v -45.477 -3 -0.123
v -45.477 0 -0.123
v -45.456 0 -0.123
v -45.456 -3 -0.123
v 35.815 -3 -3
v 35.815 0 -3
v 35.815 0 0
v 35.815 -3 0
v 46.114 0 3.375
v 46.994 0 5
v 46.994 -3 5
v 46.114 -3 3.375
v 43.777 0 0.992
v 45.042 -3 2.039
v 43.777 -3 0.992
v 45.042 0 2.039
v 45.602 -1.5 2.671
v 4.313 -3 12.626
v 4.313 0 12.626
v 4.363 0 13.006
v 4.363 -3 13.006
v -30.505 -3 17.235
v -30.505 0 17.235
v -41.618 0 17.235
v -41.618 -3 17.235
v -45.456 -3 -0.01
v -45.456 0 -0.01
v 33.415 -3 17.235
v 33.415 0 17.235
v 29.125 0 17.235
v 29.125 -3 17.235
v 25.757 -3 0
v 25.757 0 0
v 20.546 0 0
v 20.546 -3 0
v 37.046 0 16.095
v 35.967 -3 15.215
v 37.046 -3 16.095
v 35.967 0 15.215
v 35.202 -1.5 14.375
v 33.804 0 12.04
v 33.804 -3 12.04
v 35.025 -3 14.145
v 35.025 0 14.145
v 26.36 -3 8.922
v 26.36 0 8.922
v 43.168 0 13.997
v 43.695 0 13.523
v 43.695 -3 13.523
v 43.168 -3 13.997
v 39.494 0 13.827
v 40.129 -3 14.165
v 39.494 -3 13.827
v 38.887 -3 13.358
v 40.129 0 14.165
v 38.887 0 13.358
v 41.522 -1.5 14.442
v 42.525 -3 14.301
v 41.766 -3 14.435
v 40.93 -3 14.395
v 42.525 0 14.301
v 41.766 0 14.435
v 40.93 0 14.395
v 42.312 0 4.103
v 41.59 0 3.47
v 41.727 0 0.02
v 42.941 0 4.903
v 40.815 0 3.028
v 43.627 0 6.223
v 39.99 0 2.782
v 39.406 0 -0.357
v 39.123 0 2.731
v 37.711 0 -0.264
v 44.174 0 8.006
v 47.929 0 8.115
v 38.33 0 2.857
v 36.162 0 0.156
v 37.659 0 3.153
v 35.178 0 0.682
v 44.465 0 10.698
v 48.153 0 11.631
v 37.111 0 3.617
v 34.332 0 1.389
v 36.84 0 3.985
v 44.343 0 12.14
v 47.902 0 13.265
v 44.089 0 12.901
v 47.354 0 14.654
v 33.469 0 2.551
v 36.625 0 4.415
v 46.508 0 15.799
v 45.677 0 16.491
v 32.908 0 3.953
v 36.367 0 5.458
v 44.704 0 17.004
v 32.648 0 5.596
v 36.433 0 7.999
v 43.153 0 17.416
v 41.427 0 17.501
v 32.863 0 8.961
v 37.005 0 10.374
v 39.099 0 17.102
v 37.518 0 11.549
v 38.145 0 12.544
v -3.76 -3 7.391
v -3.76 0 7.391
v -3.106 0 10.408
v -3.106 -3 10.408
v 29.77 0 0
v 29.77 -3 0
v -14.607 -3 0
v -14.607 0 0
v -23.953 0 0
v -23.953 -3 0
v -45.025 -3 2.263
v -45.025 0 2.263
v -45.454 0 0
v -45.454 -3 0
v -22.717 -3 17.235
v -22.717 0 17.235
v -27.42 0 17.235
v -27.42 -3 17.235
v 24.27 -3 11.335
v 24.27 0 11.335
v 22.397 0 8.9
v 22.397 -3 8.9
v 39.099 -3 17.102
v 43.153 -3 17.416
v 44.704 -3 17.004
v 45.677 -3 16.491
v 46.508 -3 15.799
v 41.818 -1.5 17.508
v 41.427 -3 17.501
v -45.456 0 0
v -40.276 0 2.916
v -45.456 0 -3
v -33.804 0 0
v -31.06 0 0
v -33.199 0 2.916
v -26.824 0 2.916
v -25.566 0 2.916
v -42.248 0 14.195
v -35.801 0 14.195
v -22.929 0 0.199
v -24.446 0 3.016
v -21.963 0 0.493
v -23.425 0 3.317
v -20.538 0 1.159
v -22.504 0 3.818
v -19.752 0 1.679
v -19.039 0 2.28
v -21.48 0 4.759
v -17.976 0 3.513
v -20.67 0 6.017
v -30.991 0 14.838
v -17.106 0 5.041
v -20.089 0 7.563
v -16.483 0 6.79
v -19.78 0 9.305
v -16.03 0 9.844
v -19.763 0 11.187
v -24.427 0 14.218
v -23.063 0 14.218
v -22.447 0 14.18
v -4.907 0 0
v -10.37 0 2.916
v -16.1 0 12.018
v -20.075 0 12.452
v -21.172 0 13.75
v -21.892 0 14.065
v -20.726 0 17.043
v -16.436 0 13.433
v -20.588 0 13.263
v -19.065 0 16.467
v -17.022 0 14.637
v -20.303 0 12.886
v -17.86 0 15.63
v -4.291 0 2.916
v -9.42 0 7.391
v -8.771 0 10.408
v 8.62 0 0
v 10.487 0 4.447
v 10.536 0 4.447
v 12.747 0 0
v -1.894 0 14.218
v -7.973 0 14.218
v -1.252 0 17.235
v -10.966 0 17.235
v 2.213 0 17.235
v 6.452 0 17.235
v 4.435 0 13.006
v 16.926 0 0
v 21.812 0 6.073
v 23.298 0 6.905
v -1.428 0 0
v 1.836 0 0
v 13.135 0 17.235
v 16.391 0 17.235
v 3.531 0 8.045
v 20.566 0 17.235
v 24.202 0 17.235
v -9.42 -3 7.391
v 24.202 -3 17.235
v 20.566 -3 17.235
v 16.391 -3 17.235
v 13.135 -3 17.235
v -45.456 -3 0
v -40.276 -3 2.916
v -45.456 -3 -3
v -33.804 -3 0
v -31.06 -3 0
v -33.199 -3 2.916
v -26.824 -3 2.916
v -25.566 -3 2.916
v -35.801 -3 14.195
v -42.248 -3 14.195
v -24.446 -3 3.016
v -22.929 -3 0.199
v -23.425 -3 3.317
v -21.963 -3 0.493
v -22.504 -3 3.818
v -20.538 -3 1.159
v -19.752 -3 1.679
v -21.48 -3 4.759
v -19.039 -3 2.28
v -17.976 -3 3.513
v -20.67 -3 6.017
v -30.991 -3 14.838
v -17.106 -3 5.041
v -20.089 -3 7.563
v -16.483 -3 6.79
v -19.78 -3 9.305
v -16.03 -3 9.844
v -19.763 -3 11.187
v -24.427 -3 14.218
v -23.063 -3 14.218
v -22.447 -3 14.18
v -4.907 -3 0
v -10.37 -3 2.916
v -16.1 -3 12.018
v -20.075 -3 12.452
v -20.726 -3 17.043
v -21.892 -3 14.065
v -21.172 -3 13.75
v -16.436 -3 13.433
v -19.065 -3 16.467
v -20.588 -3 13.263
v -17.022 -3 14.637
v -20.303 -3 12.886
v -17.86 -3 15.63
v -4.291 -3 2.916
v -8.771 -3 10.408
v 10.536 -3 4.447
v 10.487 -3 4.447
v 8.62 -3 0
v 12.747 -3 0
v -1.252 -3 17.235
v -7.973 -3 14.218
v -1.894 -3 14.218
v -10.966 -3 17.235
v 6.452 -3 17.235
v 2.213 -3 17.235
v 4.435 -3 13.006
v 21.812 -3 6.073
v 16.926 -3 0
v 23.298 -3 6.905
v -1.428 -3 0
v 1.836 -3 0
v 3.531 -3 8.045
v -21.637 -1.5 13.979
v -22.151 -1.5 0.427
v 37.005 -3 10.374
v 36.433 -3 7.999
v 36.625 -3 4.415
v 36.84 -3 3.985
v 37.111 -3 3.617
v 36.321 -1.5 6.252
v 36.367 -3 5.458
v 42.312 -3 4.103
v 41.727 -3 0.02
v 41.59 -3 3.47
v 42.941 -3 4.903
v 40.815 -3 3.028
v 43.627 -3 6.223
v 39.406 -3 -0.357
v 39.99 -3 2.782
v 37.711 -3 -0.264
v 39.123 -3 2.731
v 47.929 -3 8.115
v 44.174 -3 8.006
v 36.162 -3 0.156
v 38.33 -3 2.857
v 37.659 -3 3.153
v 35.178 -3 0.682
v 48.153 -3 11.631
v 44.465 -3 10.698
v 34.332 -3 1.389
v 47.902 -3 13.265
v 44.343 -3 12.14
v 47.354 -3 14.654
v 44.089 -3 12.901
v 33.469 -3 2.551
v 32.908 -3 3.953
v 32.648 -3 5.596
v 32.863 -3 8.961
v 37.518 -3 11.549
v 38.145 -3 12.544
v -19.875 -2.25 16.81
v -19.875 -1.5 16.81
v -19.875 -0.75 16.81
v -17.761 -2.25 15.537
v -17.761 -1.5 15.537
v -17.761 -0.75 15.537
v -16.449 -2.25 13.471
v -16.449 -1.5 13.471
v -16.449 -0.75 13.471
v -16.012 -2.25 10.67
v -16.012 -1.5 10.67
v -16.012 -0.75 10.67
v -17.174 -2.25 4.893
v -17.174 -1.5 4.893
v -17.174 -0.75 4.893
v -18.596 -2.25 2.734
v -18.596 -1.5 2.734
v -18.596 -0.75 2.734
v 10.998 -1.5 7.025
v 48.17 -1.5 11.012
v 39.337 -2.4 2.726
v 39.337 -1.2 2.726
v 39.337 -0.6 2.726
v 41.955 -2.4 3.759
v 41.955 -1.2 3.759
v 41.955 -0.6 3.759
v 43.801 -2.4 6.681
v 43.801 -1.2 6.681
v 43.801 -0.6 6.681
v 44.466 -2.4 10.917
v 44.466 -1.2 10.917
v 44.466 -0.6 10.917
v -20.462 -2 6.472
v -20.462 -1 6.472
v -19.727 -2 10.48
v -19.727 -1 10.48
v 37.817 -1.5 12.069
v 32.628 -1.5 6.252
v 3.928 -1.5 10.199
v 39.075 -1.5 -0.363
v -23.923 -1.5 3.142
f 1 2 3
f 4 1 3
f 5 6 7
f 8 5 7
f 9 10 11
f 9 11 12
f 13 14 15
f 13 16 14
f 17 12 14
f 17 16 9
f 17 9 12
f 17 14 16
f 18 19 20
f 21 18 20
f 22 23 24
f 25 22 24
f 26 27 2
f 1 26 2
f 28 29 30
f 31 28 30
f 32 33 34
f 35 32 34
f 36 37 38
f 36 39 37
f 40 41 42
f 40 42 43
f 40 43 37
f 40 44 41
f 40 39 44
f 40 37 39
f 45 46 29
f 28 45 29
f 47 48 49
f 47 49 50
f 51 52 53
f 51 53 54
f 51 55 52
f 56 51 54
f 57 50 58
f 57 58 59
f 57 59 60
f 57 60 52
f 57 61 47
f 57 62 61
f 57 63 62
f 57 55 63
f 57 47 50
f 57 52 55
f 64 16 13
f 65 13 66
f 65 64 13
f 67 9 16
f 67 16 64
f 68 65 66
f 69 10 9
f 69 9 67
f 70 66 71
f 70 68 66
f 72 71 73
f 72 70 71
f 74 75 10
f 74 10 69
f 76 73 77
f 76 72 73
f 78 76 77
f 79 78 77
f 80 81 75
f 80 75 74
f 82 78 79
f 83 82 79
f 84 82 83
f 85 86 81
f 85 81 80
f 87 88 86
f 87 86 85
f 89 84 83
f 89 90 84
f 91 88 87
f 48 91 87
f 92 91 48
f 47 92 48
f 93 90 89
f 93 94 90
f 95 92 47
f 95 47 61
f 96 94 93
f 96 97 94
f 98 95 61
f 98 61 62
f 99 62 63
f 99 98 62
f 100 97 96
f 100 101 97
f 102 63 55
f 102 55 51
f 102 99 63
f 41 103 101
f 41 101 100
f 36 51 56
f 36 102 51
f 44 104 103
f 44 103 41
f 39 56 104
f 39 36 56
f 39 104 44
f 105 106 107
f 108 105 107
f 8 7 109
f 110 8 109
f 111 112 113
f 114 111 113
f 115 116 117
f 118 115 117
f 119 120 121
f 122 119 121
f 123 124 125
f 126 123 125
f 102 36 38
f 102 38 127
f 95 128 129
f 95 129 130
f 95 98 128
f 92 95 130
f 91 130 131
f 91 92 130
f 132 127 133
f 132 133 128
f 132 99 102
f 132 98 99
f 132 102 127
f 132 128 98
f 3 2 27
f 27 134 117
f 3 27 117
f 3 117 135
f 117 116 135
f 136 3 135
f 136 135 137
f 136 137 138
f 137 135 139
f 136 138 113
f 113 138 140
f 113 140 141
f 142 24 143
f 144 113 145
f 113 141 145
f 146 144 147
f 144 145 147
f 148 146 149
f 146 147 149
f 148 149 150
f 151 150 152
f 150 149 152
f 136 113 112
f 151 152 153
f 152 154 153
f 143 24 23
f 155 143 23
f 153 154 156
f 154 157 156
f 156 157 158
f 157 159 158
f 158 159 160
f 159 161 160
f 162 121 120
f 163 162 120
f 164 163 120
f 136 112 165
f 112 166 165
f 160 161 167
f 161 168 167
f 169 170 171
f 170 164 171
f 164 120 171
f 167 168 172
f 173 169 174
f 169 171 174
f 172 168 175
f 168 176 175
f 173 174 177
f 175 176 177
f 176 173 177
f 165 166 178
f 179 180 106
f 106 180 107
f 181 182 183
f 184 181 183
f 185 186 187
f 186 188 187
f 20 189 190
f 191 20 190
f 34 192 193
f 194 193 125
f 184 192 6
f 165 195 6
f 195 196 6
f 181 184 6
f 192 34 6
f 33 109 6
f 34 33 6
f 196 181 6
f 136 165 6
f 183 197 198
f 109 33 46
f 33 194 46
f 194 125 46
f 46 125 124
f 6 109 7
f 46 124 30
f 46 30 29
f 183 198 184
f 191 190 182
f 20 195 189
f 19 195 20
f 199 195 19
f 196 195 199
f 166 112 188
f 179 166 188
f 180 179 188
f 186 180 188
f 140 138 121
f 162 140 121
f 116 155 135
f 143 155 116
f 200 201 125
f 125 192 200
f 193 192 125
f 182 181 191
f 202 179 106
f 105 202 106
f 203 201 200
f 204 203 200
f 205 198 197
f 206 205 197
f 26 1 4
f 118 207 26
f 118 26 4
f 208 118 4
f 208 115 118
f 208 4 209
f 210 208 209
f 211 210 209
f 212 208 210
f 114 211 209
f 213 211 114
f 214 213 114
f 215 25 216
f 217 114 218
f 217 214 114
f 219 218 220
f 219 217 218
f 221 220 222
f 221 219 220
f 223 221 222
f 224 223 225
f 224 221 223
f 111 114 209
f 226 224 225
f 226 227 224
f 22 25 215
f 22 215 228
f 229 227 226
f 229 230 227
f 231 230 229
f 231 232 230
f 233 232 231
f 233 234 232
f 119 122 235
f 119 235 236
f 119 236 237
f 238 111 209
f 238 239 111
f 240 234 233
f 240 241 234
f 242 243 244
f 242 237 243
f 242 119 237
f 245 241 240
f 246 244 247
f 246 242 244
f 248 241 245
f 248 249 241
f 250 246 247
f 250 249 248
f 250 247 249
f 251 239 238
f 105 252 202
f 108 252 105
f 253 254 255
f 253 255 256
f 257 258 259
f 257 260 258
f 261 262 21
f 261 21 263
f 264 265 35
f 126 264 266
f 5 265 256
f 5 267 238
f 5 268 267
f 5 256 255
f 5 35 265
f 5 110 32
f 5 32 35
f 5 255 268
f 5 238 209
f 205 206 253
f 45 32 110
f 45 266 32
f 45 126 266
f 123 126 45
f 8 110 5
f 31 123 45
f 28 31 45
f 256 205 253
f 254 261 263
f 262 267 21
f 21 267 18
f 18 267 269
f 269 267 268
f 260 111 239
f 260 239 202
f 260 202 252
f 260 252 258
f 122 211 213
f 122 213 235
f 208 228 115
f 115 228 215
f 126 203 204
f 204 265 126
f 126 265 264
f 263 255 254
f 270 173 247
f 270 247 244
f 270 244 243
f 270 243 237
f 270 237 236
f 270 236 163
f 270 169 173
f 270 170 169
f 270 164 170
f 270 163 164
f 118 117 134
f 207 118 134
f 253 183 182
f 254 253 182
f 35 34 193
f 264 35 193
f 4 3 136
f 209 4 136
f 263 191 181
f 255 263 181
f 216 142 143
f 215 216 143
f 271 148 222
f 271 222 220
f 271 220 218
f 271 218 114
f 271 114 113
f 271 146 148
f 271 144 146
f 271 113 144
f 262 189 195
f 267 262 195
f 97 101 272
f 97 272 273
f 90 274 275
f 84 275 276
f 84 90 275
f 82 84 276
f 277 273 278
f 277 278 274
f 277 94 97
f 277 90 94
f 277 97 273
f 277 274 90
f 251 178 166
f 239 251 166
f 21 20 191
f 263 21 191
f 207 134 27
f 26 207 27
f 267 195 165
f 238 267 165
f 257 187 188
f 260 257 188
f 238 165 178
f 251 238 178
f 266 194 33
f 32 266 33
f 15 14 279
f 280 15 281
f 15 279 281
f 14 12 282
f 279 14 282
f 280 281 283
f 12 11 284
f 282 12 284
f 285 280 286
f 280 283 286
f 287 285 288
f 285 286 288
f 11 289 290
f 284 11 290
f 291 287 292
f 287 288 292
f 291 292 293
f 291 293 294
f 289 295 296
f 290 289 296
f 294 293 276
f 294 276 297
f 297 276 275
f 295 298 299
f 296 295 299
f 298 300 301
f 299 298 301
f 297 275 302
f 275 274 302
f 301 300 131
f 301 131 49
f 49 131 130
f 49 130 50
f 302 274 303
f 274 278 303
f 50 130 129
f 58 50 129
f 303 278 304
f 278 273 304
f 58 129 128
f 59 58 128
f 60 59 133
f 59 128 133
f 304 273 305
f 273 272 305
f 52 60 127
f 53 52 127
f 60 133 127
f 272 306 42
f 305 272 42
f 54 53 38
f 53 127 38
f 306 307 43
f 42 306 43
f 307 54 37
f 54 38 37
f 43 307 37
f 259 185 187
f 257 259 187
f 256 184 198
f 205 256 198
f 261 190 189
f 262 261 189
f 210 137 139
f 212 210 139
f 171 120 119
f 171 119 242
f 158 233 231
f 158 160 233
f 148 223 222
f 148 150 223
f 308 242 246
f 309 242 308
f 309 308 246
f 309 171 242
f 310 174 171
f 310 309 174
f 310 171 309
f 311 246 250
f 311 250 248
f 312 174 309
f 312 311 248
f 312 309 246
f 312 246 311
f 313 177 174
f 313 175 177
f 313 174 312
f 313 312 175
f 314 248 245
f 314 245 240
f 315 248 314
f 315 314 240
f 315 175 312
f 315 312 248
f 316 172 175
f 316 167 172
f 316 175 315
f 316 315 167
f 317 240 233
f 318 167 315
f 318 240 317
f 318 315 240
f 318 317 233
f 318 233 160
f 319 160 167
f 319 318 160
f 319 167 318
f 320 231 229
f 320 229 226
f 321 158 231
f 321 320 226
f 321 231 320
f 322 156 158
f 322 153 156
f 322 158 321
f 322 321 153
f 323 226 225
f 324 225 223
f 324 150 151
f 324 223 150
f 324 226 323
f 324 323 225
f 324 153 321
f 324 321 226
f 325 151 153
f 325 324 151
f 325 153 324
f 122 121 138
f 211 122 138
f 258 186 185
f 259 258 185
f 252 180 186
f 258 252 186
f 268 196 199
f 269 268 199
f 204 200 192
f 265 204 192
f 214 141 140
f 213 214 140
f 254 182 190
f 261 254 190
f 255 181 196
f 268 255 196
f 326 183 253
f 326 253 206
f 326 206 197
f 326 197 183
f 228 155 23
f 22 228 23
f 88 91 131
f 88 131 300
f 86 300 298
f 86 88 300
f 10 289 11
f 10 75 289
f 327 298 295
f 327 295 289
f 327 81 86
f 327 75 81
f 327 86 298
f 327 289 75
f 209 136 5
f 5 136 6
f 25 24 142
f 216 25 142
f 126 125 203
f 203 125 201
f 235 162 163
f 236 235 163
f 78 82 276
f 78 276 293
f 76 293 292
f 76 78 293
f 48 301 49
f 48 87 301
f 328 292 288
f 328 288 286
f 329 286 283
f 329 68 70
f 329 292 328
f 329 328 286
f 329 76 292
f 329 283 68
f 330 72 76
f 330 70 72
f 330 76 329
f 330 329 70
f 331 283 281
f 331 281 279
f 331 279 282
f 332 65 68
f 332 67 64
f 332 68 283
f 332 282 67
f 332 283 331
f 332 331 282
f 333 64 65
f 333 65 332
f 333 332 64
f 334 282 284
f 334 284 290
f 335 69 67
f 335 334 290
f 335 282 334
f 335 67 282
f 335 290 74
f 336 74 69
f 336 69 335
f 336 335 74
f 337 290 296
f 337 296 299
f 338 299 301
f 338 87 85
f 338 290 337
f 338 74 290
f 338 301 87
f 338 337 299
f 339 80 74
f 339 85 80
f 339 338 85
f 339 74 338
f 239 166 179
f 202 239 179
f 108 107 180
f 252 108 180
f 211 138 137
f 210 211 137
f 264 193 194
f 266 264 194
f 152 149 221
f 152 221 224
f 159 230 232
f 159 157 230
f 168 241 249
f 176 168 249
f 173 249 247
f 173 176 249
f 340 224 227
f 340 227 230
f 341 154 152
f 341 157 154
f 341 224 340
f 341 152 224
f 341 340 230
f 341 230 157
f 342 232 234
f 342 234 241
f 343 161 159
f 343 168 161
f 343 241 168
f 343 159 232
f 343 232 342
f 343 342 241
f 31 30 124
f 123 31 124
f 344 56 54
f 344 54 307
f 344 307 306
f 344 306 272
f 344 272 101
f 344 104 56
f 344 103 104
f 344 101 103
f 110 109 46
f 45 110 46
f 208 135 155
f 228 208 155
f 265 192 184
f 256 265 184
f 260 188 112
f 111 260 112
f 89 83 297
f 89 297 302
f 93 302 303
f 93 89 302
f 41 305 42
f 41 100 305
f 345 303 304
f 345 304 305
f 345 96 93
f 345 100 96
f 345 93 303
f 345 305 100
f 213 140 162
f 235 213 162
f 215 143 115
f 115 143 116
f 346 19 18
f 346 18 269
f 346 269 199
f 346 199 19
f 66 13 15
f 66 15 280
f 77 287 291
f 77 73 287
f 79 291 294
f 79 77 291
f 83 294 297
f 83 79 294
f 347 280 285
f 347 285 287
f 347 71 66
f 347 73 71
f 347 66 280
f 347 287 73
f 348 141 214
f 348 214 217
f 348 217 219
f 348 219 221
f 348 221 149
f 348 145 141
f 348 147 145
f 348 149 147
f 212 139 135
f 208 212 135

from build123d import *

# Parameters (mm, degrees)
F1_DEPTH = 3


with BuildPart() as f1:
    # F0 (on Front) → F1 (new body)
    with BuildSketch(Plane.XZ):
        Polygon((-45.4540743535, 0), (-45.4559984316, 0), (-45.4559984316, -0.0101539581), align=None)
        Polygon((-45.0253434094, 2.2625464951), (-45.4540743535, 0), (-33.8038387864, 0), (-33.1987708043, 2.9159902754), (-40.2764787269, 2.9159902754), (-30.9914984999, 14.8375401741), (-30.5052147564, 17.2347670658), (-41.6175581133, 17.2347670658), (-42.2482073431, 14.1954936691), (-35.8011486502, 14.1954936691), align=None)
        Polygon((-33.8038387864, 0), (-45.4540743535, 0), (-45.4559984316, -0.0101539581), (-45.4559984316, -0.1232831214), (-33.8294200341, -0.1232831214), align=None)
        Polygon((-45.4559984316, -0.1232831214), (-45.4559984316, -0.0101539581), (-45.4774353271, -0.1232831214), align=None)
        with BuildLine():
            Line((-31.0604376644, 0), (-33.8038387864, 0))
            Line((-33.8038387864, 0), (-33.8294200341, -0.1232831214))
            Line((-33.8294200341, -0.1232831214), (-45.4559984316, -0.1232831214))
            Line((-45.4559984316, -0.1232831214), (-45.4559984316, -3))
            Line((-45.4559984316, -3), (35.8146238138, -3))
            Line((35.8146238138, -3), (35.8146238138, 0))
            Line((35.8146238138, 0), (29.769646119, 0))
            Line((29.769646119, 0), (29.8167639856, -0.1232831214))
            Line((29.8167639856, -0.1232831214), (25.8011240102, -0.1232831214))
            Line((25.8011240102, -0.1232831214), (25.7572085631, 0))
            Line((25.7572085631, 0), (20.5460862143, 0))
            Line((20.5460862143, 0), (20.5203864833, -0.1232831214))
            Line((20.5203864833, -0.1232831214), (16.8998520494, -0.1232831214))
            Line((16.8998520494, -0.1232831214), (16.9258901786, 0))
            Line((16.9258901786, 0), (12.7469162406, 0))
            Line((12.7469162406, 0), (12.7208511289, -0.1232831214))
            Line((12.7208511289, -0.1232831214), (8.6596220525, -0.1232831214))
            Line((8.6596220525, -0.1232831214), (8.6199545667, 0))
            Line((8.6199545667, 0), (1.8358351015, 0))
            Line((1.8358351015, 0), (1.8098596346, -0.1232831214))
            Line((1.8098596346, -0.1232831214), (-1.4535601752, -0.1232831214))
            Line((-1.4535601752, -0.1232831214), (-1.4275220461, 0))
            Line((-1.4275220461, 0), (-4.9074846551, 0))
            Line((-4.9074846551, 0), (-4.9335282145, -0.1232831214))
            Line((-4.9335282145, -0.1232831214), (-14.6326094419, -0.1232831214))
            Line((-14.6326094419, -0.1232831214), (-14.6065713127, 0))
            Line((-14.6065713127, 0), (-23.9531483885, 0))
            add(Edge.make_bspline(
                [(-23.9531483885, 0), (-24.8052711696, -0.1232831214), (-25.7335555235, -0.1232831214)],
                knots=[0.6899190889, 0.6899190889, 0.6899190889, 1, 1, 1], degree=2))
            Line((-25.7335555235, -0.1232831214), (-31.0864757935, -0.1232831214))
            Line((-31.0864757935, -0.1232831214), (-31.0604376644, 0))
        make_face()
        with BuildLine():
            Line((-27.4203522587, 17.2347670658), (-31.0604376644, 0))
            Line((-31.0604376644, 0), (-23.9531483885, 0))
            add(Edge.make_bspline(
                [(-20.5382975609, 1.1589103429), (-22.0572052593, 0.2743005962), (-23.9531483885, 0)],
                knots=[0, 0, 0, 0.6899190889, 0.6899190889, 0.6899190889], degree=2))
            add(Edge.make_bspline(
                [(-17.1742018199, 4.8934175292), (-18.3367238942, 2.4411038072), (-20.5382975609, 1.1589103429)],
                knots=[0, 0, 0, 1, 1, 1], degree=2))
            add(Edge.make_bspline(
                [(-16.0116797456, 10.6699365289), (-16.0116797456, 7.3457312512), (-17.1742018199, 4.8934175292)],
                knots=[0, 0, 0, 1, 1, 1], degree=2))
            add(Edge.make_bspline(
                [(-17.7611614946, 15.5365730554), (-16.0116797456, 13.838379045), (-16.0116797456, 10.6699365289)],
                knots=[0, 0, 0, 1, 1, 1], degree=2))
            add(Edge.make_bspline(
                [(-22.7170766772, 17.2347670658), (-19.5106432436, 17.2347670658), (-17.7611614946, 15.5365730554)],
                knots=[0, 0, 0, 1, 1, 1], degree=2))
            Line((-22.7170766772, 17.2347670658), (-27.4203522587, 17.2347670658))
        make_face()
        with BuildLine():
            add(Edge.make_bspline(
                [(-25.5663954867, 2.9159902754), (-23.8112151, 2.9159902754), (-22.5043275394, 3.8182745651)],
                knots=[0, 0, 0, 1, 1, 1], degree=2))
            Line((-25.5663954867, 2.9159902754), (-26.8238948546, 2.9159902754))
            Line((-26.8238948546, 2.9159902754), (-24.4266679629, 14.2182882196))
            Line((-24.4266679629, 14.2182882196), (-23.0627940261, 14.2182882196))
            add(Edge.make_bspline(
                [(-20.5876857536, 13.2628166455), (-21.4481800341, 14.2182882196), (-23.0627940261, 14.2182882196)],
                knots=[0, 0, 0, 1, 1, 1], degree=2))
            add(Edge.make_bspline(
                [(-19.7271914732, 10.4799819416), (-19.7271914732, 12.3073450714), (-20.5876857536, 13.2628166455)],
                knots=[0, 0, 0, 1, 1, 1], degree=2))
            add(Edge.make_bspline(
                [(-20.462315726, 6.4719401496), (-19.7271914732, 8.2233214445), (-19.7271914732, 10.4799819416)],
                knots=[0, 0, 0, 1, 1, 1], degree=2))
            add(Edge.make_bspline(
                [(-22.5043275394, 3.8182745651), (-21.1974399788, 4.7205588547), (-20.462315726, 6.4719401496)],
                knots=[0, 0, 0, 1, 1, 1], degree=2))
        make_face(mode=Mode.SUBTRACT)
        with BuildLine():
            Line((-23.9531483885, 0), (-31.0604376644, 0))
            Line((-31.0604376644, 0), (-31.0864757935, -0.1232831214))
            Line((-31.0864757935, -0.1232831214), (-25.7335555235, -0.1232831214))
            add(Edge.make_bspline(
                [(-23.9531483885, 0), (-24.8052711696, -0.1232831214), (-25.7335555235, -0.1232831214)],
                knots=[0.6899190889, 0.6899190889, 0.6899190889, 1, 1, 1], degree=2))
        make_face()
        Polygon((-10.966485907, 17.2347670658), (-14.6065713127, 0), (-4.9074846551, 0), (-4.2914817094, 2.9159902754), (-10.3700285029, 2.9159902754), (-9.4202555664, 7.3913203521), (-3.759608865, 7.3913203521), (-3.1061650847, 10.4077991984), (-8.7706108779, 10.4077991984), (-7.9728016112, 14.2182882196), (-1.8942548177, 14.2182882196), (-1.2522083127, 17.2347670658), align=None)
        Polygon((-4.9074846551, 0), (-14.6065713127, 0), (-14.6326094419, -0.1232831214), (-4.9335282145, -0.1232831214), align=None)
        Polygon((29.8167639856, -0.1232831214), (29.769646119, 0), (25.7572085631, 0), (25.8011240102, -0.1232831214), align=None)
        Polygon((25.7572085631, 0), (29.769646119, 0), (26.3595904968, 8.9223543257), (33.414503869, 17.2347670658), (29.1253292878, 17.2347670658), (24.2700900365, 11.3347775844), (22.3971378058, 8.8995597752), (24.2017063851, 17.2347670658), (20.5659755843, 17.2347670658), (16.9258901786, 0), (20.5460862143, 0), (21.8120776769, 6.0730355163), (23.2975225496, 6.9050366086), align=None)
        with BuildLine():
            Line((2.2125633596, 17.2347670658), (-1.4275220461, 0))
            Line((-1.4275220461, 0), (1.8358351015, 0))
            Line((1.8358351015, 0), (3.5308481955, 8.0447641324))
            add(Edge.make_bspline(
                [(4.3134610951, 12.626468778), (3.9335519205, 10.0620818495), (3.5308481955, 8.0447641324)],
                knots=[0, 0, 0, 1, 1, 1], degree=2))
            Line((4.3134610951, 12.626468778), (4.3628492878, 13.0063779526))
            Line((4.3628492878, 13.0063779526), (4.435032031, 13.0063779526))
            Line((4.435032031, 13.0063779526), (8.6199545667, 0))
            Line((8.6199545667, 0), (12.7469162406, 0))
            Line((12.7469162406, 0), (16.3907737555, 17.2347670658))
            Line((16.3907737555, 17.2347670658), (13.1349521292, 17.2347670658))
            add(Edge.make_bspline(
                [(10.9979630221, 7.0247079986), (11.3189862746, 8.6982079127), (13.1349521292, 17.2347670658)],
                knots=[0, 0, 0, 1, 1, 1], degree=2))
            add(Edge.make_bspline(
                [(10.536373375, 4.447024249), (10.6769397696, 5.3512080845), (10.9979630221, 7.0247079986)],
                knots=[0, 0, 0, 1, 1, 1], degree=2))
            Line((10.536373375, 4.447024249), (10.4869851823, 4.447024249))
            Line((10.4869851823, 4.447024249), (6.4523497481, 17.2347670658))
            Line((6.4523497481, 17.2347670658), (2.2125633596, 17.2347670658))
        make_face()
        Polygon((1.8358351015, 0), (-1.4275220461, 0), (-1.4535601752, -0.1232831214), (1.8098596346, -0.1232831214), align=None)
        Polygon((20.5203864833, -0.1232831214), (20.5460862143, 0), (16.9258901786, 0), (16.8998520494, -0.1232831214), align=None)
        Polygon((12.7469162406, 0), (8.6199545667, 0), (8.6596220525, -0.1232831214), (12.7208511289, -0.1232831214), align=None)
        with BuildLine():
            add(Edge.make_bspline(
                [(48.1701762102, 11.011854786), (48.1701762102, 7.6534576826), (46.9943573149, 4.999792098)],
                knots=[0, 0, 0, 1, 1, 1], degree=2))
            add(Edge.make_bspline(
                [(46.5080735714, 15.7987103859), (48.1701762102, 14.0891191002), (48.1701762102, 11.011854786)],
                knots=[0, 0, 0, 1, 1, 1], degree=2))
            add(Edge.make_bspline(
                [(41.818094811, 17.5083016715), (44.8459709325, 17.5083016715), (46.5080735714, 15.7987103859)],
                knots=[0, 0, 0, 1, 1, 1], degree=2))
            add(Edge.make_bspline(
                [(37.0464355781, 16.0950395421), (39.1131414879, 17.5083016715), (41.818094811, 17.5083016715)],
                knots=[0, 0, 0, 1, 1, 1], degree=2))
            add(Edge.make_bspline(
                [(33.803910773, 12.0395091033), (34.9797296683, 14.6817774126), (37.0464355781, 16.0950395421)],
                knots=[0, 0, 0, 1, 1, 1], degree=2))
            add(Edge.make_bspline(
                [(32.6280918776, 6.2515928283), (32.6280918776, 9.397240794), (33.803910773, 12.0395091033)],
                knots=[0, 0, 0, 1, 1, 1], degree=2))
            add(Edge.make_bspline(
                [(34.3319845257, 1.3887553935), (32.6280918776, 3.1401366884), (32.6280918776, 6.2515928283)],
                knots=[0, 0, 0, 1, 1, 1], degree=2))
            add(Edge.make_bspline(
                [(39.0751505705, -0.3626259014), (36.0358771737, -0.3626259014), (34.3319845257, 1.3887553935)],
                knots=[0, 0, 0, 1, 1, 1], degree=2))
            add(Edge.make_bspline(
                [(43.7765266061, 0.9917503061), (41.7345147926, -0.3626259014), (39.0751505705, -0.3626259014)],
                knots=[0, 0, 0, 1, 1, 1], degree=2))
            add(Edge.make_bspline(
                [(46.9943573149, 4.999792098), (45.8185384195, 2.3461265135), (43.7765266061, 0.9917503061)],
                knots=[0, 0, 0, 1, 1, 1], degree=2))
        make_face()
        with BuildLine():
            add(Edge.make_bspline(
                [(41.5217656548, 14.4424346326), (40.0857089749, 14.4424346326), (38.887095529, 13.3577939391)],
                knots=[0, 0, 0, 1, 1, 1], degree=2))
            add(Edge.make_bspline(
                [(43.6948461335, 13.5230544301), (42.9236305091, 14.4424346326), (41.5217656548, 14.4424346326)],
                knots=[0, 0, 0, 1, 1, 1], degree=2))
            add(Edge.make_bspline(
                [(44.4660617579, 10.9168774923), (44.4660617579, 12.6036742275), (43.6948461335, 13.5230544301)],
                knots=[0, 0, 0, 1, 1, 1], degree=2))
            add(Edge.make_bspline(
                [(43.8012207024, 6.6808901956), (44.4660617579, 8.5690387933), (44.4660617579, 10.9168774923)],
                knots=[0, 0, 0, 1, 1, 1], degree=2))
            add(Edge.make_bspline(
                [(41.9548621139, 3.759388643), (43.1363796469, 4.7927415979), (43.8012207024, 6.6808901956)],
                knots=[0, 0, 0, 1, 1, 1], degree=2))
            add(Edge.make_bspline(
                [(39.3372879009, 2.7260356881), (40.7733445809, 2.7260356881), (41.9548621139, 3.759388643)],
                knots=[0, 0, 0, 1, 1, 1], degree=2))
            add(Edge.make_bspline(
                [(37.1110201378, 3.6169227025), (37.901231221, 2.7260356881), (39.3372879009, 2.7260356881)],
                knots=[0, 0, 0, 1, 1, 1], degree=2))
            add(Edge.make_bspline(
                [(36.3208090547, 6.2515928283), (36.3208090547, 4.5078097169), (37.1110201378, 3.6169227025)],
                knots=[0, 0, 0, 1, 1, 1], degree=2))
            add(Edge.make_bspline(
                [(37.0046455689, 10.3736073727), (36.3208090547, 8.4740614997), (36.3208090547, 6.2515928283)],
                knots=[0, 0, 0, 1, 1, 1], degree=2))
            add(Edge.make_bspline(
                [(38.887095529, 13.3577939391), (37.6884820832, 12.2731532456), (37.0046455689, 10.3736073727)],
                knots=[0, 0, 0, 1, 1, 1], degree=2))
        make_face(mode=Mode.SUBTRACT)
    extrude(amount=F1_DEPTH)


solid = f1.part
